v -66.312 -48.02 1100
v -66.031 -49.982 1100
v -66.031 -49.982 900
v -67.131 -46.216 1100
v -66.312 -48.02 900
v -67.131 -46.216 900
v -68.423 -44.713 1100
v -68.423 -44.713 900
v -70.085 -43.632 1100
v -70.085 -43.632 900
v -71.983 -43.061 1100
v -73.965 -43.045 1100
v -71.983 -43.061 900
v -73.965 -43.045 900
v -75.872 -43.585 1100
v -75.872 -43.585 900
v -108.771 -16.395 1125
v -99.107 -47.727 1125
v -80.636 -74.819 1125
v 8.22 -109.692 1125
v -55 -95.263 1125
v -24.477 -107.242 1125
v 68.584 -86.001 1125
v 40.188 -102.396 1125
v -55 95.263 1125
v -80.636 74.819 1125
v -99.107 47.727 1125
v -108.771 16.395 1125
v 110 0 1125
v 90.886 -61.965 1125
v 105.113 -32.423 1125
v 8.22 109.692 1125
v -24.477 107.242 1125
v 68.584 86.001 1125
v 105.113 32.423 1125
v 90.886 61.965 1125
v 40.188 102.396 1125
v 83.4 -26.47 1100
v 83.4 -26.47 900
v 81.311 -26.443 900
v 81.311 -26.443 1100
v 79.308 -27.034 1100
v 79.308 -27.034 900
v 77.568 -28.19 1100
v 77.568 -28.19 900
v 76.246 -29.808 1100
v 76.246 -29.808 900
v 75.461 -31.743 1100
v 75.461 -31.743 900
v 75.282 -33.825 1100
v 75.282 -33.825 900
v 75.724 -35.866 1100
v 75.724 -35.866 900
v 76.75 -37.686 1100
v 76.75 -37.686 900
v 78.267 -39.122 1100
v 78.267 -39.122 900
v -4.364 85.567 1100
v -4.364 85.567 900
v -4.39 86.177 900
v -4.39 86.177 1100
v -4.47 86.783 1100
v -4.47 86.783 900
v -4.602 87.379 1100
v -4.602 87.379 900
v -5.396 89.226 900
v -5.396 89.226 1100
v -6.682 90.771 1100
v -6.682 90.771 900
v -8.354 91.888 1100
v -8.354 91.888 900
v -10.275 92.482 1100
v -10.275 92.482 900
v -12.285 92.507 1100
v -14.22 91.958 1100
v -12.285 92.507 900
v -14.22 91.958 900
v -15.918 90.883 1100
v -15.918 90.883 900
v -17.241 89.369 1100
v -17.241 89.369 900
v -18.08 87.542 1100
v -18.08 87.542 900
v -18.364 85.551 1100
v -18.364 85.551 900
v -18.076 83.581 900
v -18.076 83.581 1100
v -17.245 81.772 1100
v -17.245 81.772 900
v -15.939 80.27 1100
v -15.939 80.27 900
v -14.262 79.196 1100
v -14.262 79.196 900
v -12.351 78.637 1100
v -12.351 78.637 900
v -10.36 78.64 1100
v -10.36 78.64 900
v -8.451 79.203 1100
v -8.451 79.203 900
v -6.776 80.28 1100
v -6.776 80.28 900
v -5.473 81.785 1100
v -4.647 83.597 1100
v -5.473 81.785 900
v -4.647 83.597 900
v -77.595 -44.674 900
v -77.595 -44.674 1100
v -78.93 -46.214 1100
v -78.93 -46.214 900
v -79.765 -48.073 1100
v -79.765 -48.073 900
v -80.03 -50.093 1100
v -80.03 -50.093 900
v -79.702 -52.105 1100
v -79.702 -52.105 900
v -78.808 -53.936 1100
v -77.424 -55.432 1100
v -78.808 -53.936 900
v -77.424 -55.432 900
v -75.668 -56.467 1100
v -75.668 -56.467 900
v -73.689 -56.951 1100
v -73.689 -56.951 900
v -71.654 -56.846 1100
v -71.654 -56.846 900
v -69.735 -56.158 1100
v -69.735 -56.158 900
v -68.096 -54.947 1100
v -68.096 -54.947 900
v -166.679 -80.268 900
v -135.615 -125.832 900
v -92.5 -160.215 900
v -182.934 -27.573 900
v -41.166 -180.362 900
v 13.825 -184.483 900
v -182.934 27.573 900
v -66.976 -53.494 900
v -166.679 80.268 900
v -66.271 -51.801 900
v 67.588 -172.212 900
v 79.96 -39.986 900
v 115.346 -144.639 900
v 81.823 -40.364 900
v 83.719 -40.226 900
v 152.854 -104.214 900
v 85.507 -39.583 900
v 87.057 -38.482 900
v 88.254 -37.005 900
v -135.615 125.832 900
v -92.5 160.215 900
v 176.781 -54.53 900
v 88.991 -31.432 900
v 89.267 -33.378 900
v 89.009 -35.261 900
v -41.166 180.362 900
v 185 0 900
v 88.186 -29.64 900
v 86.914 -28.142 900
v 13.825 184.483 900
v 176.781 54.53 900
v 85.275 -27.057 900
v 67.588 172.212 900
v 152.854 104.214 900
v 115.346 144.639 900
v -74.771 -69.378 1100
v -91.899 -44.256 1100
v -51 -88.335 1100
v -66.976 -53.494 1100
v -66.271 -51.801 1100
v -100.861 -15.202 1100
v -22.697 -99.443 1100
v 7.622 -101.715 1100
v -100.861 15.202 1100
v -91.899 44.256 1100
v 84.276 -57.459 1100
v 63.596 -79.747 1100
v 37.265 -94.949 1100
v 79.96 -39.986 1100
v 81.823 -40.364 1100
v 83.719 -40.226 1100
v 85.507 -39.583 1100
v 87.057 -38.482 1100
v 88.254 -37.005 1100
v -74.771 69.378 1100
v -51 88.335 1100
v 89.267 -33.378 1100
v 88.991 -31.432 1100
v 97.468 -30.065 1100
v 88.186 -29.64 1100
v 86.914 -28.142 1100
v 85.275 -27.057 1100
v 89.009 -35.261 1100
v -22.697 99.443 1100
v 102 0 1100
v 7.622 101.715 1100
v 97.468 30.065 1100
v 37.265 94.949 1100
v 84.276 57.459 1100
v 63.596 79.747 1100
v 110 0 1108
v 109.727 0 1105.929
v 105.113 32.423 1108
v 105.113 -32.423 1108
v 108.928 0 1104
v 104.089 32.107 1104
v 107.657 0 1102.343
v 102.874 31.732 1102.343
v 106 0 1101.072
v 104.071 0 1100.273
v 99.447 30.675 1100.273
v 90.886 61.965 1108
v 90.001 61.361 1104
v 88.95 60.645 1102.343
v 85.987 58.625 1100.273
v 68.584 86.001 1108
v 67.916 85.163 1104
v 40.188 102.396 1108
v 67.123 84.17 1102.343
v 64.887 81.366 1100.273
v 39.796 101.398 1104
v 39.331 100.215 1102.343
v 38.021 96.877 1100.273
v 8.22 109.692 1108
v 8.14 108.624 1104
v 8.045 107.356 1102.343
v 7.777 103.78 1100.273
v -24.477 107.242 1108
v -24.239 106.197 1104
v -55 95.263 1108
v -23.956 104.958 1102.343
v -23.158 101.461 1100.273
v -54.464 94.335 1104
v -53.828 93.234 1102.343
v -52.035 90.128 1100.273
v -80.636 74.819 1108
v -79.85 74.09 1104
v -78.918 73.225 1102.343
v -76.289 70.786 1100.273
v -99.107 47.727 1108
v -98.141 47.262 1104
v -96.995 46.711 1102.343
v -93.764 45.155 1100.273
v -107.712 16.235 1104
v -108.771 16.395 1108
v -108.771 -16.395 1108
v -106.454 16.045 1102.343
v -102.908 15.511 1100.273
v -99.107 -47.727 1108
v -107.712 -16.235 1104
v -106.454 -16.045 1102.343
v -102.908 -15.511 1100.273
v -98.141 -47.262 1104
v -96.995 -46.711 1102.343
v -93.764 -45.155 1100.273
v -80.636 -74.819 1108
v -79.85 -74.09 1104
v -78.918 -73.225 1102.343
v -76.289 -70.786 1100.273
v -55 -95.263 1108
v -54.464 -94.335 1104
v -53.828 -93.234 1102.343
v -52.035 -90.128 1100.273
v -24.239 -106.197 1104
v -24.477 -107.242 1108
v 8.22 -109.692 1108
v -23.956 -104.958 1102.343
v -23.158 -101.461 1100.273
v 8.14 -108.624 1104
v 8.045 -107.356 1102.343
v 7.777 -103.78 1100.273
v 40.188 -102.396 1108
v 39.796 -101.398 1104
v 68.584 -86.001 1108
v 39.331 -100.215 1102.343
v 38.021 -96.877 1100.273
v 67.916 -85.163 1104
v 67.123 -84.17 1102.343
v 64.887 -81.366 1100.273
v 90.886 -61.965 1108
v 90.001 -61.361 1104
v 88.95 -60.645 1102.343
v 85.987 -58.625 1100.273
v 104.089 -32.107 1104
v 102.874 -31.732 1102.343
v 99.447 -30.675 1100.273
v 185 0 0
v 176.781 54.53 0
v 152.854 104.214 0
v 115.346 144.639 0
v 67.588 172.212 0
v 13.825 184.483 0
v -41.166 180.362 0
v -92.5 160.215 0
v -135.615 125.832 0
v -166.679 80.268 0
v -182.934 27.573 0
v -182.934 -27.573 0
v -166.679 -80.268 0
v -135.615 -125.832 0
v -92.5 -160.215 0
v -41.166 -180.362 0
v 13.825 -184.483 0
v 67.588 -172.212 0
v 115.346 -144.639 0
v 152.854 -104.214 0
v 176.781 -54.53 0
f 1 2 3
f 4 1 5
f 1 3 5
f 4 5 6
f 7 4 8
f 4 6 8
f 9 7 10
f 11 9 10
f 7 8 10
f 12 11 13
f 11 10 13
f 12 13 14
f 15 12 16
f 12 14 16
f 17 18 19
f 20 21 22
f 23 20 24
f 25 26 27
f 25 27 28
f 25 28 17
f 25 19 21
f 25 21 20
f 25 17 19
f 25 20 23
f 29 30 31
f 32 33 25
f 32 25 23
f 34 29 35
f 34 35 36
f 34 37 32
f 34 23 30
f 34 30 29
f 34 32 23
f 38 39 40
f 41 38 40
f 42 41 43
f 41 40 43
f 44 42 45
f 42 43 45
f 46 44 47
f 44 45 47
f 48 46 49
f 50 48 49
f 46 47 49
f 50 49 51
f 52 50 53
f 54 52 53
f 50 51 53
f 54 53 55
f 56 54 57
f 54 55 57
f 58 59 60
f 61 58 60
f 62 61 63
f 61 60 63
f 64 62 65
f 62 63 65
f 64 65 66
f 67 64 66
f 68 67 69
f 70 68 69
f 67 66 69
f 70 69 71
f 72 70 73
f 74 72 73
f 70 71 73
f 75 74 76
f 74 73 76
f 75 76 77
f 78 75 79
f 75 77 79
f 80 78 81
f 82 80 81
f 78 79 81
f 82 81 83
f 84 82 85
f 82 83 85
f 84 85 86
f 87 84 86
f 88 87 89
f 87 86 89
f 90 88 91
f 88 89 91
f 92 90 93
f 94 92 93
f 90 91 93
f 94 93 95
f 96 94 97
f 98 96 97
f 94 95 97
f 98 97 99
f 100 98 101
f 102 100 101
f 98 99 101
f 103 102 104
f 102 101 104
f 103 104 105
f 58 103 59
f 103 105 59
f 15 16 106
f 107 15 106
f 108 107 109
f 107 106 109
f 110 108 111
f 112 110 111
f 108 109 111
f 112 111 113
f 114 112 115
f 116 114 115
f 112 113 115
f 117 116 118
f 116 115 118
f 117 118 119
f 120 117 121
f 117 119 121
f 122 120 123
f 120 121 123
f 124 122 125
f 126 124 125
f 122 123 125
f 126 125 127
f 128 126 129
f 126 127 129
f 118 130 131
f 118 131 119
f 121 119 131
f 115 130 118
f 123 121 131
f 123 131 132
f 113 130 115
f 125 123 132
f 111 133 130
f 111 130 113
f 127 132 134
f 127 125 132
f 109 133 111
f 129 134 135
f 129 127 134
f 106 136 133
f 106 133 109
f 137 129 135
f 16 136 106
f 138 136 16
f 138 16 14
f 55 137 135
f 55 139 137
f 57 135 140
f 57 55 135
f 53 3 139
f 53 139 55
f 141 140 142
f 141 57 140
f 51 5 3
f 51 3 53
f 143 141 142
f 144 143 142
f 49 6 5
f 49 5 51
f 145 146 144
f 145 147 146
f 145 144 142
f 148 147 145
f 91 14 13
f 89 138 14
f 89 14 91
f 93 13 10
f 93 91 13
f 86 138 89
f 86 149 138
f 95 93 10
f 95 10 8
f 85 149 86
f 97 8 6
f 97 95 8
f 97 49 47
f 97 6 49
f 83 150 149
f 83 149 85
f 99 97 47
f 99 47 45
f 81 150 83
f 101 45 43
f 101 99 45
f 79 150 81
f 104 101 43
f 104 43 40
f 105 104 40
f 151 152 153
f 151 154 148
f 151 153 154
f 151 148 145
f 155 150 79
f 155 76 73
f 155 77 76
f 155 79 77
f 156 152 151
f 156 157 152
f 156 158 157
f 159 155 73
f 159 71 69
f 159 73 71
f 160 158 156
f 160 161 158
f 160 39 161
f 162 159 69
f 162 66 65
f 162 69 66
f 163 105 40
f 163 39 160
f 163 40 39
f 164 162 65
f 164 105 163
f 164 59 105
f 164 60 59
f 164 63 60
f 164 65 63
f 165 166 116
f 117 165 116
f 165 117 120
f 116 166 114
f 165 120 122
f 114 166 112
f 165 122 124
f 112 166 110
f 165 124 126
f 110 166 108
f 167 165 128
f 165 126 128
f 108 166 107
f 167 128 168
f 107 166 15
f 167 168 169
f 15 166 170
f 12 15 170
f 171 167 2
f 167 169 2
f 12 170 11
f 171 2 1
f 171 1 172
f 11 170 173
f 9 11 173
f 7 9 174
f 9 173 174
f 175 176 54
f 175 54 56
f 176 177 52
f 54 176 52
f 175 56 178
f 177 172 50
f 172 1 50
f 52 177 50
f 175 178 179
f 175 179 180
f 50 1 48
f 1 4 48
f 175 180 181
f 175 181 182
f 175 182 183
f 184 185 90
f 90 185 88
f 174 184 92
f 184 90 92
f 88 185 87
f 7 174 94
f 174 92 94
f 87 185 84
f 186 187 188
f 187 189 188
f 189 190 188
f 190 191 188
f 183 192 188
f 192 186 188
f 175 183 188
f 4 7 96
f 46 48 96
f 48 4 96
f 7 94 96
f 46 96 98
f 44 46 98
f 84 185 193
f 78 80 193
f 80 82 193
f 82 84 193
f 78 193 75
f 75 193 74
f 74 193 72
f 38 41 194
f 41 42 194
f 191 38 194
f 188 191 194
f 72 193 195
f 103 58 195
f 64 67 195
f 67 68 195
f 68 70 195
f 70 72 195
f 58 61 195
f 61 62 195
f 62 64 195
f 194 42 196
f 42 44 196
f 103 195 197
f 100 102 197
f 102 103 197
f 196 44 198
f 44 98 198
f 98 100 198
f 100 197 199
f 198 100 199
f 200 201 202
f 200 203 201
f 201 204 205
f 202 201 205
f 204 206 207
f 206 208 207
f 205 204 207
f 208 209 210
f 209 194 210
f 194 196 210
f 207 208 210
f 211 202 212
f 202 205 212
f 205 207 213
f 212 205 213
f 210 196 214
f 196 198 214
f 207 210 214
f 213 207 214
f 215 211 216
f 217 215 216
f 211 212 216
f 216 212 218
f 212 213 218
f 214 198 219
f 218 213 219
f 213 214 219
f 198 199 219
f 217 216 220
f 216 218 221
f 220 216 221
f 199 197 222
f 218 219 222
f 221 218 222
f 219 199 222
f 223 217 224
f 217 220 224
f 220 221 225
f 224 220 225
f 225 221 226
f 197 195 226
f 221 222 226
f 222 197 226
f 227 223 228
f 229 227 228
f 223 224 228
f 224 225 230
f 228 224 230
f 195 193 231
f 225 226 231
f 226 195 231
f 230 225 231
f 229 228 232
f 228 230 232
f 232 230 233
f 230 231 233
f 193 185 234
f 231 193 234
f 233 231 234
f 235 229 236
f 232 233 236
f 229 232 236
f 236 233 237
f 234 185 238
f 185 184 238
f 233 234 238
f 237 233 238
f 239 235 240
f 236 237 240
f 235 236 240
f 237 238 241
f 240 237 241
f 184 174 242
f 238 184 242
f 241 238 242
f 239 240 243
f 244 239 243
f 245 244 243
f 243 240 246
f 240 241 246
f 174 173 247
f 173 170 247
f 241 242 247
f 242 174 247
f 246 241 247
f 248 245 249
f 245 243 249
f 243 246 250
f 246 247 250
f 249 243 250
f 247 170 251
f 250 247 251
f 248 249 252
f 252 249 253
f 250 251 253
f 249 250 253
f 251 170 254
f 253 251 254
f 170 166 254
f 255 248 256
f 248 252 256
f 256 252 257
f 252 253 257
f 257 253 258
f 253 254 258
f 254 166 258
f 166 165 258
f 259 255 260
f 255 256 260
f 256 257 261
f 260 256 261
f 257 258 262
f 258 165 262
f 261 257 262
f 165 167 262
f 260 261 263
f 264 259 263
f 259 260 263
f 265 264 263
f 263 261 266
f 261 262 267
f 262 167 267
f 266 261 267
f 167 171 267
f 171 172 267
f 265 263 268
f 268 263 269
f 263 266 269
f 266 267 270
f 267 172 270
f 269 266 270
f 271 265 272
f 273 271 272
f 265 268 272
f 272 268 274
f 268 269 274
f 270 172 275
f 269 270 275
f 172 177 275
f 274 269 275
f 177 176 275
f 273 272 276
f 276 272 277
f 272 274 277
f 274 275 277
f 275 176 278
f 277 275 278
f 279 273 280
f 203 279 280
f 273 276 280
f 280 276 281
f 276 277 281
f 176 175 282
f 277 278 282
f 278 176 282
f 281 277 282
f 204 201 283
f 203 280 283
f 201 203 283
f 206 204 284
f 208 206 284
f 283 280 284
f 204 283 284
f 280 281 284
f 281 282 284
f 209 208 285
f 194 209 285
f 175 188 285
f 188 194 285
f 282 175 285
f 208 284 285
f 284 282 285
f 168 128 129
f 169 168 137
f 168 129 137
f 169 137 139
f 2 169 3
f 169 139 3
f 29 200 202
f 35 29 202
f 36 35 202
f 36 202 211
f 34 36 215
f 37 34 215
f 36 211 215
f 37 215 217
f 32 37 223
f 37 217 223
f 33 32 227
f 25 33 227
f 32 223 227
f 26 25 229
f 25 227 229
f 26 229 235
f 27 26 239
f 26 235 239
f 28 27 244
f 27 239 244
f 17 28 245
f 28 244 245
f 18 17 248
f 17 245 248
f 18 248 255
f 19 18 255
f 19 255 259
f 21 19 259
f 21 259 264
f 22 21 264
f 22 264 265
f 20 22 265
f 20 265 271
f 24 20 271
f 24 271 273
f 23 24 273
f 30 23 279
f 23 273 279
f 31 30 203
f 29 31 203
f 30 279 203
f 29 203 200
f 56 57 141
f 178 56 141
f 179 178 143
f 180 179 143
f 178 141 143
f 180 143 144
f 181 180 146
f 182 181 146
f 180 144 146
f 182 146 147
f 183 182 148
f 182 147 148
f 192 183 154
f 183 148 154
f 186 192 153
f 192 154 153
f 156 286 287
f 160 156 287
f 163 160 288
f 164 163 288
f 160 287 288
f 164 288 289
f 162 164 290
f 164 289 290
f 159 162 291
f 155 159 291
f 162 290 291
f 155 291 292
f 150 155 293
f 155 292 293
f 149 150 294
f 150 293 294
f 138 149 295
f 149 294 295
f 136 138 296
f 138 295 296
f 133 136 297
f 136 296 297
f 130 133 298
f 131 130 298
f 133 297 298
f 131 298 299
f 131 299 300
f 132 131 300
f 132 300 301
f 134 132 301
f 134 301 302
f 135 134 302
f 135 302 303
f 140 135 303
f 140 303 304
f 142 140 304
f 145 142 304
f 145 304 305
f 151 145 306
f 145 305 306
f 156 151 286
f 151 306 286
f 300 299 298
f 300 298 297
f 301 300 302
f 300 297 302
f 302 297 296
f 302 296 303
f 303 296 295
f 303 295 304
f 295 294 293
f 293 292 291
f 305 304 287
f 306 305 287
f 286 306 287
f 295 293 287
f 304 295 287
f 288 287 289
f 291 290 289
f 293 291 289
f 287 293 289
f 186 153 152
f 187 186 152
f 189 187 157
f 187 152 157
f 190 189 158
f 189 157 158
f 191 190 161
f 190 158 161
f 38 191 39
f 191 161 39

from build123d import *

# Parameters (mm, degrees)
F0_R     = 185
F1_DEPTH = 900
F4_DEPTH = 200
F5_R     = 110
F5_R_2   = 7
F6_DEPTH = 25
F7_R     = 8


with BuildPart() as f1:
    # F0 (on Top) → F1 (new body)
    with BuildSketch(Plane.XY):
        Circle(F0_R)
    extrude(amount=F1_DEPTH)

    # F3 (on face) → F4 (join)
    with BuildSketch(Plane.XY.offset(900)):
        with BuildLine():
            ThreePointArc((83.400185, -26.469967), (75.780776, -30.745971), (78.266953, -39.122041))
            ThreePointArc((78.266953, -39.122041), (81.080729, -32.896282), (83.400185, -26.469967))
        make_face()
        with BuildLine():
            ThreePointArc((83.400185, -26.469967), (81.080729, -32.896282), (78.266953, -39.122041))
            ThreePointArc((78.266953, -39.122041), (85.507452, -39.58259), (89.267234, -33.377674))
            ThreePointArc((89.267234, -33.377674), (87.602525, -28.846154), (83.400185, -26.469967))
        make_face()
        with BuildLine():
            ThreePointArc((-68.096127, -54.946951), (-72.208025, -49.419138), (-75.872273, -43.584954))
            ThreePointArc((-75.872273, -43.584954), (-78.807669, -53.935931), (-68.096127, -54.946951))
        make_face()
        with BuildLine():
            ThreePointArc((-68.096127, -54.946951), (-66.56789, -52.670867), (-66.031027, -49.9824))
            ThreePointArc((-66.031027, -49.9824), (-69.215842, -44.113469), (-75.872273, -43.584954))
            ThreePointArc((-75.872273, -43.584954), (-72.208025, -49.419138), (-68.096127, -54.946951))
        make_face()
        with BuildLine():
            ThreePointArc((-4.602196, 87.378886), (-11.519275, 86.738436), (-18.36375, 85.551287))
            ThreePointArc((-18.36375, 85.551287), (-11.355664, 78.567501), (-4.363768, 85.567496))
            ThreePointArc((-4.363768, 85.567496), (-4.423631, 86.481003), (-4.602196, 87.378886))
        make_face()
        with BuildLine():
            ThreePointArc((-4.602196, 87.378886), (-12.28531, 92.506571), (-18.36375, 85.551287))
            ThreePointArc((-18.36375, 85.551287), (-11.519275, 86.738436), (-4.602196, 87.378886))
        make_face()
    extrude(amount=F4_DEPTH)

    # F5 (on face) → F6 (join)
    with BuildSketch(Plane.XY.offset(1100)):
        Circle(F5_R)
        with Locations((-11.363768, 85.567496)):
            Circle(F5_R_2, mode=Mode.SUBTRACT)
        with Locations((-11.363768, 85.567496)):
            Circle(F5_R_2)
    extrude(amount=F6_DEPTH)

    # F7
    f7_edges = [f1.edges().sort_by_distance(p)[0] for p in [
        (-110, 0, 1100),
    ]]
    fillet(f7_edges, radius=F7_R)


solid = f1.part
